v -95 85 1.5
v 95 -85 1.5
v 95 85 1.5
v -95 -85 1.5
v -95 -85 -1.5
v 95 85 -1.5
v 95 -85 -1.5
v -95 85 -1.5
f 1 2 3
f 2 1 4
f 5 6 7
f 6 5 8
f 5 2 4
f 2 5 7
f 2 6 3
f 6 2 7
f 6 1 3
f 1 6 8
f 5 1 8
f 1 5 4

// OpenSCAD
// ========================================
// a 190 x 170 x 3 mm plate
// NeuroCAD canonical IR; dimensions are millimetres
// ========================================
$fn = 48;

cube(size=[190, 170, 3], center=true);
